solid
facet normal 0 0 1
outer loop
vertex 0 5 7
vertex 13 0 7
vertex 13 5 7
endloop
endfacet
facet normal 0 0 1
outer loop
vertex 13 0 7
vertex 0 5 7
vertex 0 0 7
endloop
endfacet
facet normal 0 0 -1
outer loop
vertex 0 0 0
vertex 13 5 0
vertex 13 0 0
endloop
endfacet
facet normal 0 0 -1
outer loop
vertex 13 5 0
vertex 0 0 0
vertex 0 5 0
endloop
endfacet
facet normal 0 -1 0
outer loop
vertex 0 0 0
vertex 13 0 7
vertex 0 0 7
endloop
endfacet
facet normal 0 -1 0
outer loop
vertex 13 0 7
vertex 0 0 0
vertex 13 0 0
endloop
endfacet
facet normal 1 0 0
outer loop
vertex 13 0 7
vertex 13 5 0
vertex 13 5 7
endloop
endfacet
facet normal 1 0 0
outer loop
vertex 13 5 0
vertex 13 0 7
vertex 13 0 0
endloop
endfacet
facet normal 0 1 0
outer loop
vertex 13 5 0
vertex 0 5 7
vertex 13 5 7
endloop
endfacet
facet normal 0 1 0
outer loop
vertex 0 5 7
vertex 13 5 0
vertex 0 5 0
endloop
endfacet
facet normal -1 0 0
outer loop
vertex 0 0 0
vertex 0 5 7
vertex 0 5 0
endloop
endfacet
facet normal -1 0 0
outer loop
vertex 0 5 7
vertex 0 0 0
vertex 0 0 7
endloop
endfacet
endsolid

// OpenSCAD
// Generated by SolidPython 1.0.1 on 2020-07-29 00:46:55


cube(size = [13, 5, 7]);
/***********************************************
*********      SolidPython code:      **********
************************************************
 
# import packages: SolidPython
from solid import *
from solid.utils import *
from itertools import chain, combinations, permutations


class Resize:

    def __init__(self, scad_file):
        self.scad_file = scad_file
        #self.scad_file = import_scad(scad_file)
        # cone/cylinder param:
        self.r1 = 0
        self.r2 = 0
        self.h = 0
        # rectangular prism param:
        self.w = 0
        self.l = 0
        # ellipse param:
        self.r = 0

    # import OpenScad code (file name corresponds to shape)


    # classify shape + parameters
    def assign(self, param1, param2, param3):
        if self.scad_file == 'cone.scad':
            self.r1 = param1
            self.r2 = param2
            self.h = param3
        elif self.scad_file == 'cylinder.scad':
            self.r1 = param1
            self.r2 = param2
            self.h = param3
        elif self.scad_file == 'rectangularPrism.scad':
            self.h = param1
            self.l = param2
            self.w = param3
        else:
            self.r = param1
            self.h = param2

    # resize parameters
    def iterate(self):
        x = range(3, 20, 2)
        i = 1
        if self.scad_file == 'cone.scad':
            tempList = list(permutations(x, 2))
            for temp in tempList:
                param1 = temp[0]
                param2 = temp[1]
                filepath = 'produced_scad_files/' + 'cone' + str(param1) + '_' + str(param2) + '_' + '.scad'
                scad_render_to_file(cylinder(h=param1, r1=param2, r2=0), filepath)

        elif self.scad_file == 'cylinder.scad':
            tempList = list(permutations(x, 3))
            for temp in tempList:
                param1 = temp[0]
                param2 = temp[1]
                filepath = 'produced_scad_files/' + 'cylinder' + str(param1) + '_' + str(param2) + '_' + '.scad'
                scad_render_to_file(cylinder(h=param1, r1=param2, r2=param2), filepath)

        elif self.scad_file == 'rectangularPrism.scad':
            tempList = list(permutations(x, 3))
            for temp in tempList:
                param1 = temp[0]
                param2 = temp[1]
                param3 = temp[2]
                filepath = 'produced_scad_files/' + 'rectangularPrism' + str(param1) + '_' + str(param2) + '_' + str(
                    param3) + '.scad'
                scad_render_to_file(cube(size=(param1, param2, param3)), filepath)

        elif self.scad_file == 'ellipse.scad':
            tempList = list(permutations(x, 4))
            for temp in tempList:
                param1 = temp[0]
                param2 = temp[1]
                param3 = temp[2]
                param4 = temp[3]
                filepath = 'produced_scad_files/' + 'ellipse' + str(param1) + '_' + str(param2) + '_' + str(param3) + '_' + str(param4) + '.scad'
                scad_render_to_file(scale([param1, param2, param3])(sphere(r=param4)), filepath)

    def render_to_scadfile(self):
        scad_render_to_file(scad, 'example.scad') 
 
************************************************/
